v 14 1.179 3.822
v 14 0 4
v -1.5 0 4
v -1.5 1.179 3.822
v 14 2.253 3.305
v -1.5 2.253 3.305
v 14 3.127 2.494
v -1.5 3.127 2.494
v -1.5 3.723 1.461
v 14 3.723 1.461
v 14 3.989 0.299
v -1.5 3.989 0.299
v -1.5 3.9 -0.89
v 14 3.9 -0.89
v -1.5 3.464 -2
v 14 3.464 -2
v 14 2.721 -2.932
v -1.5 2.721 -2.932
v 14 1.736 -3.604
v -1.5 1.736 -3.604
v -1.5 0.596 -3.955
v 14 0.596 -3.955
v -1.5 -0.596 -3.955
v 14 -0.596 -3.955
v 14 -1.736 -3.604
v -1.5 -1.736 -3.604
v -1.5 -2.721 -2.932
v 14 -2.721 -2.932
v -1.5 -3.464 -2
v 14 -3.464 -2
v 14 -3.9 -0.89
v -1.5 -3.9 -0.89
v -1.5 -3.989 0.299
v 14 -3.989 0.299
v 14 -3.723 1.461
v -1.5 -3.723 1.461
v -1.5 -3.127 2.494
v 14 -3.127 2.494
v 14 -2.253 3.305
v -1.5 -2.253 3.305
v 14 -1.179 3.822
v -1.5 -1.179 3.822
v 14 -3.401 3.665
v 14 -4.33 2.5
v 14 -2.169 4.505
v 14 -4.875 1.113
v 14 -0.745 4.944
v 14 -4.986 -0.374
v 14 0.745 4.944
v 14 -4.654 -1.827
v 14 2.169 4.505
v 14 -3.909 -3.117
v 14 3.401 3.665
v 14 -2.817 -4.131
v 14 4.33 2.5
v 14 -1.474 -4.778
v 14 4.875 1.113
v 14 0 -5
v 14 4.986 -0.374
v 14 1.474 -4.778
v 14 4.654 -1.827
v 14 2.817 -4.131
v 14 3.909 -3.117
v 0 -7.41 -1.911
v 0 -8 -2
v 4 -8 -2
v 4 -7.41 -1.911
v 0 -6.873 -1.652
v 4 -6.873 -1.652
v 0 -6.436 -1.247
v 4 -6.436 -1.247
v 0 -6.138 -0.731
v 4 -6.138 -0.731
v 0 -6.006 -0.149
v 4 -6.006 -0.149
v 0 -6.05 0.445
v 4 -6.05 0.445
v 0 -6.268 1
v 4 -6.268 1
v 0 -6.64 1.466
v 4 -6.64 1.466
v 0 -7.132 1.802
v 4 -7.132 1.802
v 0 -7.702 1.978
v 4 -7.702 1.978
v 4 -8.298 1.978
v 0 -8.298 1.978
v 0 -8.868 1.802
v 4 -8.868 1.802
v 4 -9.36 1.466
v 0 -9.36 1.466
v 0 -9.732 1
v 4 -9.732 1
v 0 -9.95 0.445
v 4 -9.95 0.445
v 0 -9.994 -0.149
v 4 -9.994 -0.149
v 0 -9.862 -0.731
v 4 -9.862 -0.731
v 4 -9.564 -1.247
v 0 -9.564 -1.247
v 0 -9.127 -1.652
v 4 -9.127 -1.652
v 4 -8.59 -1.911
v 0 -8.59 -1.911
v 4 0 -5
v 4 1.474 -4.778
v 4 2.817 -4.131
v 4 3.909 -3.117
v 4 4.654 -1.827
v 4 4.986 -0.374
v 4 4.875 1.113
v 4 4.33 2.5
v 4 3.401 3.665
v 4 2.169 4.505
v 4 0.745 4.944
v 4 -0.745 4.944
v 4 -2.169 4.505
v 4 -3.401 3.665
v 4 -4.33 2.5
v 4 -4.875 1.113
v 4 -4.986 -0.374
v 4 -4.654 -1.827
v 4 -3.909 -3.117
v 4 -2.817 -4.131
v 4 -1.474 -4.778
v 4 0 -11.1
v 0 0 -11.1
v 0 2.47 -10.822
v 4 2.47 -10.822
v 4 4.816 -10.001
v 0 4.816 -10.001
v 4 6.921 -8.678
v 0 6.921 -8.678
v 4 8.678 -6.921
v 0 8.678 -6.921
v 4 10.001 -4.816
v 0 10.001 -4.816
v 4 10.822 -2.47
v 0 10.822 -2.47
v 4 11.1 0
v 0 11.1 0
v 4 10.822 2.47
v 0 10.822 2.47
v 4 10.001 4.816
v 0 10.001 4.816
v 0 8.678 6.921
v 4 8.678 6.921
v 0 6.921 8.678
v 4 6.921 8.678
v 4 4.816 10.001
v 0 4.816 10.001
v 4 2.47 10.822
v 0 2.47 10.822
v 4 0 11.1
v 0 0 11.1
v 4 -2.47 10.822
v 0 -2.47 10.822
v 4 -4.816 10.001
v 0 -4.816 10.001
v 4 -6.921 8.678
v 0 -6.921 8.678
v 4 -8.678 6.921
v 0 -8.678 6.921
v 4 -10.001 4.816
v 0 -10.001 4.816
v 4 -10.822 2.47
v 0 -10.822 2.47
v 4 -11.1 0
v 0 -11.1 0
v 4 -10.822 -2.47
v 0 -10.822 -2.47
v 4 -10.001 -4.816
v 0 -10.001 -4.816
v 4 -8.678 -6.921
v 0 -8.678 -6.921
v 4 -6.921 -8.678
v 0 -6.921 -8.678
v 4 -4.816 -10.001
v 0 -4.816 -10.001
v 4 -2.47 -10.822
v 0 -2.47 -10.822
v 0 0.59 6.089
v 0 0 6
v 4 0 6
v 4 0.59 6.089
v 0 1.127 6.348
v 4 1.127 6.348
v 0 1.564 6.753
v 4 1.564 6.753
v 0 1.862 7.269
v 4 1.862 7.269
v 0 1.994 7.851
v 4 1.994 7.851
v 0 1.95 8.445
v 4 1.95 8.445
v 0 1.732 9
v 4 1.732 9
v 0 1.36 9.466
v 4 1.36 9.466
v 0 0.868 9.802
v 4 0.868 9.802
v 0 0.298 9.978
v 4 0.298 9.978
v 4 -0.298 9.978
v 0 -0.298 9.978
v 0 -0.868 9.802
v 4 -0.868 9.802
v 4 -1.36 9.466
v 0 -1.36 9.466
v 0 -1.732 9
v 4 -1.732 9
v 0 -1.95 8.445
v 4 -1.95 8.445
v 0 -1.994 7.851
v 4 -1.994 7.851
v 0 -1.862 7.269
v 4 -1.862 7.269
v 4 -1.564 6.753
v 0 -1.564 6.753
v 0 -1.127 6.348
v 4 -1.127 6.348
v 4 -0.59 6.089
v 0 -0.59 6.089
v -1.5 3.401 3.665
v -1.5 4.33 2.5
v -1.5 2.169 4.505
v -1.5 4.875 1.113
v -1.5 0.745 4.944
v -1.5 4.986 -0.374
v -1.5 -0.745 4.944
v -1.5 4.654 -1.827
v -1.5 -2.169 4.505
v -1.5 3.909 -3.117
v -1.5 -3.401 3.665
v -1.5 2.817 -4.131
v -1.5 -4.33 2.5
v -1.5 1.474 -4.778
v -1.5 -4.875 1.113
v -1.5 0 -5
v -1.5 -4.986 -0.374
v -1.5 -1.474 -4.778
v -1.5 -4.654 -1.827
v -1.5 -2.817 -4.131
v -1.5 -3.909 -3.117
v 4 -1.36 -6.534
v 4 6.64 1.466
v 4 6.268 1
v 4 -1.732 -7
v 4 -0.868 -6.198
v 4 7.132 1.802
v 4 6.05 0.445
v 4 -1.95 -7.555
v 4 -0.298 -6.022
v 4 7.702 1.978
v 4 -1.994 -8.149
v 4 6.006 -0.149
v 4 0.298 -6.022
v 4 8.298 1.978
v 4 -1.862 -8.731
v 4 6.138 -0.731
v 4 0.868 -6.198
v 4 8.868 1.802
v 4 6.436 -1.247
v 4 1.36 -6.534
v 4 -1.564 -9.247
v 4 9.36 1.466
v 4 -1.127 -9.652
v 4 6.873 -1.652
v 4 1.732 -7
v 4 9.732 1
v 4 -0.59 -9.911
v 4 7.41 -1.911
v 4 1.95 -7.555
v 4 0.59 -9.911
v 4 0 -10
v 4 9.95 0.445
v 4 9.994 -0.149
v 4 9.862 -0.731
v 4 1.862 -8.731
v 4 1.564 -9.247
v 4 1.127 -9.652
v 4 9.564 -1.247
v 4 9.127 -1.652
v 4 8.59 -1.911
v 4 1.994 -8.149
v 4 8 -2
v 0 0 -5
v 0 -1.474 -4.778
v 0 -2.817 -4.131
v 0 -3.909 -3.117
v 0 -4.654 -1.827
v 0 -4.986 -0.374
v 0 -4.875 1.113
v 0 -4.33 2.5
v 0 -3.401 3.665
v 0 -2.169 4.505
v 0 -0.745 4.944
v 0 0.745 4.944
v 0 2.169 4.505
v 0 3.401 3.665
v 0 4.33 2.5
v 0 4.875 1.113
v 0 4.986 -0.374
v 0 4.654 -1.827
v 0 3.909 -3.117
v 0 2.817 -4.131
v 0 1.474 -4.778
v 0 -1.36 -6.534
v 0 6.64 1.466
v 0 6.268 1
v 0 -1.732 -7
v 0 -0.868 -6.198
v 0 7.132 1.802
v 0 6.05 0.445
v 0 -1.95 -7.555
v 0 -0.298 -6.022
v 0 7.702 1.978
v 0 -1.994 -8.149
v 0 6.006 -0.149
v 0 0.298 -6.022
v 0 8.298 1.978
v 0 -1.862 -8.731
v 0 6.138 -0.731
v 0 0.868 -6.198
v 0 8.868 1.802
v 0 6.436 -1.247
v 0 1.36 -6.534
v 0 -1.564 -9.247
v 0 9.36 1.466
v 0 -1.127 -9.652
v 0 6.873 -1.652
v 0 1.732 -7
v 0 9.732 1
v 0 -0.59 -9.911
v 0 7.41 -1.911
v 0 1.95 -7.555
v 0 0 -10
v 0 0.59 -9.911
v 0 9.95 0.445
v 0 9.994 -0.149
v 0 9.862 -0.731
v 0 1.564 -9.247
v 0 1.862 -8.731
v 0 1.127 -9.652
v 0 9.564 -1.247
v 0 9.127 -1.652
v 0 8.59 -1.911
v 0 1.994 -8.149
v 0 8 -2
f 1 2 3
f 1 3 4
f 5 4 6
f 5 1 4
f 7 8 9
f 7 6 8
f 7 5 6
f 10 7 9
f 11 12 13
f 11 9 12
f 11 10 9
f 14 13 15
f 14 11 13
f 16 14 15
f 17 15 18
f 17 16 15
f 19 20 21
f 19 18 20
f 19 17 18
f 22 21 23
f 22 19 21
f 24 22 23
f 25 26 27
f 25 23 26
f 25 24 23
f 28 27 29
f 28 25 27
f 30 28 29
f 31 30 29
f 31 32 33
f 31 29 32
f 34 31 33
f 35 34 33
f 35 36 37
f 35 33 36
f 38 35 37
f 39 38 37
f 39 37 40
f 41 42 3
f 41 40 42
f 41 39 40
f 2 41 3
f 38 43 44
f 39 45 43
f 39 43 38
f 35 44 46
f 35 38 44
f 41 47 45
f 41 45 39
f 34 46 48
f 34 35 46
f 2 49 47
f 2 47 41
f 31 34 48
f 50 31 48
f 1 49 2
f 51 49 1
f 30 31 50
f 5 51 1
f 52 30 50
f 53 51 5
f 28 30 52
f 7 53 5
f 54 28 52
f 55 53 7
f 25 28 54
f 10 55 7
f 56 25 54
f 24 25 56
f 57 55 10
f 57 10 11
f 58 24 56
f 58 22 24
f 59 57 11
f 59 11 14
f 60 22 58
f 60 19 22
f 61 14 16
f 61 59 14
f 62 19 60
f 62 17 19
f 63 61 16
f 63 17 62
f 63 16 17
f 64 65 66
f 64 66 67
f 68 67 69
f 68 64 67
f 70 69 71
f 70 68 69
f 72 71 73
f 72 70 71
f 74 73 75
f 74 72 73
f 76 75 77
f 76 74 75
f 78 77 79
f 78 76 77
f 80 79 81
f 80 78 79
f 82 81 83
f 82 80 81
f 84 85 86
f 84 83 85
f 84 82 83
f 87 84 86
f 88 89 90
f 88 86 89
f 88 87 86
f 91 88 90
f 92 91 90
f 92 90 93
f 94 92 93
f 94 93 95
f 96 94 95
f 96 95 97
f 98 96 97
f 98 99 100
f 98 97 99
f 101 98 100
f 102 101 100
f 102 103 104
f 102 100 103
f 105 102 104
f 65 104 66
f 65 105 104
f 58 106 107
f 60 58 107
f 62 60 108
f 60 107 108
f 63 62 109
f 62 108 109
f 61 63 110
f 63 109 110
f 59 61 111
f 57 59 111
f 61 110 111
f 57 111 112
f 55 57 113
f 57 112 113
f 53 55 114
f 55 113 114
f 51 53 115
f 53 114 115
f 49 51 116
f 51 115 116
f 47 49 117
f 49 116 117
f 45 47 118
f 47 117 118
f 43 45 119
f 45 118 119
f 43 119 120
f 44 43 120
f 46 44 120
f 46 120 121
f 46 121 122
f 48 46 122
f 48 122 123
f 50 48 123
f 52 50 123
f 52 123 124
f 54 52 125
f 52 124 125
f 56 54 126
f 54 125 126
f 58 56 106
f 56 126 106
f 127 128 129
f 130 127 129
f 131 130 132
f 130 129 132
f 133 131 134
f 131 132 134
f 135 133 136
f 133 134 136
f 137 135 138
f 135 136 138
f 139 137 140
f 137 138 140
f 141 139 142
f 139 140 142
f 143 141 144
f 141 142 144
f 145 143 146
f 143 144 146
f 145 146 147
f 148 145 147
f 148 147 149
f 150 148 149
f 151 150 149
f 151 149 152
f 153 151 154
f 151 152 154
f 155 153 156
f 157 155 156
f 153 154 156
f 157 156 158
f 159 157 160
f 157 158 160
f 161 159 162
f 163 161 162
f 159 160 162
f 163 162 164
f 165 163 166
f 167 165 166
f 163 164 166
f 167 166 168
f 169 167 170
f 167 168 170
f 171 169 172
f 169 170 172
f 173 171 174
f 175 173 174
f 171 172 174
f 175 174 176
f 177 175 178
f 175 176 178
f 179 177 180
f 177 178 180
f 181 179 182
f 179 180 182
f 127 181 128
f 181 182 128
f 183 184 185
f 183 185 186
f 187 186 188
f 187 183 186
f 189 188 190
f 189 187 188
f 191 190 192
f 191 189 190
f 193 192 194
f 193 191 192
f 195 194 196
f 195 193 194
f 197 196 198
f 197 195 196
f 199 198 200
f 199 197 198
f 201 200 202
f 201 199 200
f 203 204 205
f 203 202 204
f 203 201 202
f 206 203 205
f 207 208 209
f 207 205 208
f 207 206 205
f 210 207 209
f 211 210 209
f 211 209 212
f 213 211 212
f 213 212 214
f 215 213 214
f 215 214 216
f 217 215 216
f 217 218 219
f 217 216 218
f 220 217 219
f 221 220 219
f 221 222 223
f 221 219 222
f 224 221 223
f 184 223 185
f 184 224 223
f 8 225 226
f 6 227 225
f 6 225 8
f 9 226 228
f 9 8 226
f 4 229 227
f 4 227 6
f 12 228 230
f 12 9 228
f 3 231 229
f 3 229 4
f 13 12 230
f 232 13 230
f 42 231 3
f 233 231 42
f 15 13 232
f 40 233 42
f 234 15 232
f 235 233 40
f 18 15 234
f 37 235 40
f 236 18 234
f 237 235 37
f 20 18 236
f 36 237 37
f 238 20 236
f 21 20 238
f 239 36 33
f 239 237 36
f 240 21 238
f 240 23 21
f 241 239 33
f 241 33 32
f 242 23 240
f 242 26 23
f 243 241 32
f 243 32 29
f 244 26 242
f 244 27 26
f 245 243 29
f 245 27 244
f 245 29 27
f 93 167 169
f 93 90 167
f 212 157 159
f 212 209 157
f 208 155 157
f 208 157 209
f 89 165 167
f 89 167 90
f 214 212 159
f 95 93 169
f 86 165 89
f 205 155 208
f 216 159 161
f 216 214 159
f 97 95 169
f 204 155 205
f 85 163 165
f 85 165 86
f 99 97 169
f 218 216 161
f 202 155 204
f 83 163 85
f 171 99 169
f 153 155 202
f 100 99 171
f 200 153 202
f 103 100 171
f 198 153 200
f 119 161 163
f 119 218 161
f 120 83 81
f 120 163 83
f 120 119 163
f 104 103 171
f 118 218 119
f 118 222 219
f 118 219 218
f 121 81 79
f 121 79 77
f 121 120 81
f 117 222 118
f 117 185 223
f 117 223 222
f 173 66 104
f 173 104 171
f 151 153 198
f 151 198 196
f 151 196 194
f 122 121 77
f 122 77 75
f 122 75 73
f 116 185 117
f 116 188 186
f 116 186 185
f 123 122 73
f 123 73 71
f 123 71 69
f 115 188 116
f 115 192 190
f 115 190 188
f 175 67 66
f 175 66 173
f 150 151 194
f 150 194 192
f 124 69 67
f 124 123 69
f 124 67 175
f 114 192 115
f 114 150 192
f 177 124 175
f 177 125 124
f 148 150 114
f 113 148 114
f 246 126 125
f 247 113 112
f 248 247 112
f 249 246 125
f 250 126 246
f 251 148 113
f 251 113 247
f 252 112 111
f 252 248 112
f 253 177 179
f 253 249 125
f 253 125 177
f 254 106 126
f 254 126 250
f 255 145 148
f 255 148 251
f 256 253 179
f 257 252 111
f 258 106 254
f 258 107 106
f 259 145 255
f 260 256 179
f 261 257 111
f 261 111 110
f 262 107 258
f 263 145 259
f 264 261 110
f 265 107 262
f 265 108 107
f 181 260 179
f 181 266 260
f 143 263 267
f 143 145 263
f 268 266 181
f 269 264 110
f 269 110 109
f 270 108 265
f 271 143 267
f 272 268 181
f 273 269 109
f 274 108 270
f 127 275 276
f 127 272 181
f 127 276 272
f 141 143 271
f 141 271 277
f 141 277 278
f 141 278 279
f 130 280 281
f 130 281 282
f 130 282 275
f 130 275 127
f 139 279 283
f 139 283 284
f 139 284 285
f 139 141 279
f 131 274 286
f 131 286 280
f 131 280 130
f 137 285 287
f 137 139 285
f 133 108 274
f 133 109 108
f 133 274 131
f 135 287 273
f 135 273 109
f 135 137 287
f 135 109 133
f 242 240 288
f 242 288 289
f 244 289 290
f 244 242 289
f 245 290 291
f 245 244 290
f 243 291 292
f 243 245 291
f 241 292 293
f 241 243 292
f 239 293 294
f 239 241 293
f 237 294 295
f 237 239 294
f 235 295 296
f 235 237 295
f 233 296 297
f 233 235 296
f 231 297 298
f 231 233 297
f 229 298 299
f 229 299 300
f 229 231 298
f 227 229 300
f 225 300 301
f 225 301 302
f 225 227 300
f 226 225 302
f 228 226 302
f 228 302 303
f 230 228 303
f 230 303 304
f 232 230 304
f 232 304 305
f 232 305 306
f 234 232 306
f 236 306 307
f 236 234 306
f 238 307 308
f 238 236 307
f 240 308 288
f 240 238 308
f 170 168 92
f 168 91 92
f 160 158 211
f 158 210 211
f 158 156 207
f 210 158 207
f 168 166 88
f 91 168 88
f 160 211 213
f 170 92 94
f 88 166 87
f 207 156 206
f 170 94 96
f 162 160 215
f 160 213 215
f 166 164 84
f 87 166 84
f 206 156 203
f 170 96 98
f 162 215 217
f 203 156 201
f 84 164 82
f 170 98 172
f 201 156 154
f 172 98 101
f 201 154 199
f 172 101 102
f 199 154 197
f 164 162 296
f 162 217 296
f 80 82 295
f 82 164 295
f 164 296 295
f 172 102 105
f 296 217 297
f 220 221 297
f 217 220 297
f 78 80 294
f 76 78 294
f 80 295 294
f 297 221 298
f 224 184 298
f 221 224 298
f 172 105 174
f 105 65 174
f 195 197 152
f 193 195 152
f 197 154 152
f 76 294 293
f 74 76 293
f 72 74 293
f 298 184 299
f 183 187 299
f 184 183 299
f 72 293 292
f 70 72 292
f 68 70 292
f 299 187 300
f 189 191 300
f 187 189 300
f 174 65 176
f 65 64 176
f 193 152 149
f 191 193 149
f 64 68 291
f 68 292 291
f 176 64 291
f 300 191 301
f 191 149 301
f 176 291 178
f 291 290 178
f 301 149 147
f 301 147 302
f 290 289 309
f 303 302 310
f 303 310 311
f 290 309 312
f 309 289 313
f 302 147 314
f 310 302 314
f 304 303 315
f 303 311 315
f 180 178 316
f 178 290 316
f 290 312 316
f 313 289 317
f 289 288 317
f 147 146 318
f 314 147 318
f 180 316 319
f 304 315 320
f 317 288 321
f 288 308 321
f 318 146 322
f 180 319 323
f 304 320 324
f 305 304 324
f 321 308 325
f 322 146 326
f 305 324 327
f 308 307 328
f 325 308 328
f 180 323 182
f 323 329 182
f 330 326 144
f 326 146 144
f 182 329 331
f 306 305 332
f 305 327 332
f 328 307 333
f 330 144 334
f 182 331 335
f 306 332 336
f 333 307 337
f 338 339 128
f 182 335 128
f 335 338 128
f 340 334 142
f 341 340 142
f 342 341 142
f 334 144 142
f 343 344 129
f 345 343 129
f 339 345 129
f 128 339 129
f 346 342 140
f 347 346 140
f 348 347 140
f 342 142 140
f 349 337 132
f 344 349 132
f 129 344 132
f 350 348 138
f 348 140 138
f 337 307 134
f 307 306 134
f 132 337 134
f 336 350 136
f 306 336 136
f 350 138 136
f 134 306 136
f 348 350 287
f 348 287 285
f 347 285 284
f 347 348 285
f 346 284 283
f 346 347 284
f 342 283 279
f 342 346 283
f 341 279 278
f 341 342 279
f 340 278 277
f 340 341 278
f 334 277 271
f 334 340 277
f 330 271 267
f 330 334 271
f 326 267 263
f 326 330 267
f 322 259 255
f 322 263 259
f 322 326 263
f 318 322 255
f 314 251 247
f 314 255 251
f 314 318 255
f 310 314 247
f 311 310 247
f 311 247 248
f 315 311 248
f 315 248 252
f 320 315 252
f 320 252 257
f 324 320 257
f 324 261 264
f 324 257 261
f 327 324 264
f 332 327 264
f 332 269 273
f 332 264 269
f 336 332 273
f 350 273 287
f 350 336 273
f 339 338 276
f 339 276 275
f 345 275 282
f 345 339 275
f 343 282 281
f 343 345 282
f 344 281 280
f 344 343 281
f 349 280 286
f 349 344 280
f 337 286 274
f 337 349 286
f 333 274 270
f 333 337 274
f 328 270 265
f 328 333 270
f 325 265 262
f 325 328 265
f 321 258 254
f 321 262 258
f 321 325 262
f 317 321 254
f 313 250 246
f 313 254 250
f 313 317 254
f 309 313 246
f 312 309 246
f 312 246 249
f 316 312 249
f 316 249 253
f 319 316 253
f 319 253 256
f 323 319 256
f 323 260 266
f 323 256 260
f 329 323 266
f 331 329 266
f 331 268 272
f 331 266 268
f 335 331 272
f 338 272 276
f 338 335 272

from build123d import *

# Parameters (mm, degrees)
SKETCH1_R               = 11.1
BOSS_EXTRUDE1_DEPTH     = 4
SKETCH2_R               = 5
BOSS_EXTRUDE2_DEPTH     = 10
BOSS_EXTRUDE3_START     = 1.5
SKETCH3_R               = 5
BOSS_EXTRUDE3_DEPTH     = 1.5
CUT_EXTRUDE1_DEPTH      = 23.06059836
CUT_EXTRUDE1_DEPTH_BACK = 23.06059836
SKETCH4_R               = 4
CUT_EXTRUDE2_DEPTH      = 19.612361484
CUT_EXTRUDE2_DEPTH_BACK = 19.612361484
SKETCH5_R               = 2


with BuildPart() as part:
    # Sketch1 → Boss-Extrude1 (new body)
    with BuildSketch(Plane(origin=(0, 0, 0), x_dir=(0, 0, -1), z_dir=(1, 0, 0))):
        Circle(SKETCH1_R)
    extrude(amount=BOSS_EXTRUDE1_DEPTH)

    # Sketch2 → Boss-Extrude2 (add)
    with BuildSketch(Plane(origin=(4, 0, 0), x_dir=(0, 0, -1), z_dir=(1, 0, 0))):
        Circle(SKETCH2_R)
    extrude(amount=BOSS_EXTRUDE2_DEPTH)

    # Sketch3 → Boss-Extrude3 (add)
    with BuildSketch(Plane.ZY.offset(BOSS_EXTRUDE3_START)):
        with Locations(Location((0, 0, 0), (0, 0, 180))):
            Circle(SKETCH3_R)
    extrude(amount=-BOSS_EXTRUDE3_DEPTH)

    # Sketch4 → Cut-Extrude1 (cut, two sides: drawn at the far end of the back side and taken through both)
    with BuildSketch(Plane.ZY.offset(1.5).offset(-CUT_EXTRUDE1_DEPTH_BACK)):
        Circle(SKETCH4_R)
    extrude(amount=CUT_EXTRUDE1_DEPTH + CUT_EXTRUDE1_DEPTH_BACK, mode=Mode.SUBTRACT)

    # Sketch5 → Cut-Extrude2 (cut, two sides: drawn at the far end of the back side and taken through both)
    with BuildSketch(Plane(origin=(4, 0, 0), x_dir=(0, 0, -1), z_dir=(1, 0, 0)).offset(-CUT_EXTRUDE2_DEPTH_BACK)):
        with Locations((0, 8)):
            Circle(SKETCH5_R)
        with Locations((8, 0)):
            Circle(SKETCH5_R)
        with Locations((0, -8)):
            Circle(SKETCH5_R)
        with Locations((-8, 0)):
            Circle(SKETCH5_R)
    extrude(amount=CUT_EXTRUDE2_DEPTH + CUT_EXTRUDE2_DEPTH_BACK, mode=Mode.SUBTRACT)


solid = part.part
